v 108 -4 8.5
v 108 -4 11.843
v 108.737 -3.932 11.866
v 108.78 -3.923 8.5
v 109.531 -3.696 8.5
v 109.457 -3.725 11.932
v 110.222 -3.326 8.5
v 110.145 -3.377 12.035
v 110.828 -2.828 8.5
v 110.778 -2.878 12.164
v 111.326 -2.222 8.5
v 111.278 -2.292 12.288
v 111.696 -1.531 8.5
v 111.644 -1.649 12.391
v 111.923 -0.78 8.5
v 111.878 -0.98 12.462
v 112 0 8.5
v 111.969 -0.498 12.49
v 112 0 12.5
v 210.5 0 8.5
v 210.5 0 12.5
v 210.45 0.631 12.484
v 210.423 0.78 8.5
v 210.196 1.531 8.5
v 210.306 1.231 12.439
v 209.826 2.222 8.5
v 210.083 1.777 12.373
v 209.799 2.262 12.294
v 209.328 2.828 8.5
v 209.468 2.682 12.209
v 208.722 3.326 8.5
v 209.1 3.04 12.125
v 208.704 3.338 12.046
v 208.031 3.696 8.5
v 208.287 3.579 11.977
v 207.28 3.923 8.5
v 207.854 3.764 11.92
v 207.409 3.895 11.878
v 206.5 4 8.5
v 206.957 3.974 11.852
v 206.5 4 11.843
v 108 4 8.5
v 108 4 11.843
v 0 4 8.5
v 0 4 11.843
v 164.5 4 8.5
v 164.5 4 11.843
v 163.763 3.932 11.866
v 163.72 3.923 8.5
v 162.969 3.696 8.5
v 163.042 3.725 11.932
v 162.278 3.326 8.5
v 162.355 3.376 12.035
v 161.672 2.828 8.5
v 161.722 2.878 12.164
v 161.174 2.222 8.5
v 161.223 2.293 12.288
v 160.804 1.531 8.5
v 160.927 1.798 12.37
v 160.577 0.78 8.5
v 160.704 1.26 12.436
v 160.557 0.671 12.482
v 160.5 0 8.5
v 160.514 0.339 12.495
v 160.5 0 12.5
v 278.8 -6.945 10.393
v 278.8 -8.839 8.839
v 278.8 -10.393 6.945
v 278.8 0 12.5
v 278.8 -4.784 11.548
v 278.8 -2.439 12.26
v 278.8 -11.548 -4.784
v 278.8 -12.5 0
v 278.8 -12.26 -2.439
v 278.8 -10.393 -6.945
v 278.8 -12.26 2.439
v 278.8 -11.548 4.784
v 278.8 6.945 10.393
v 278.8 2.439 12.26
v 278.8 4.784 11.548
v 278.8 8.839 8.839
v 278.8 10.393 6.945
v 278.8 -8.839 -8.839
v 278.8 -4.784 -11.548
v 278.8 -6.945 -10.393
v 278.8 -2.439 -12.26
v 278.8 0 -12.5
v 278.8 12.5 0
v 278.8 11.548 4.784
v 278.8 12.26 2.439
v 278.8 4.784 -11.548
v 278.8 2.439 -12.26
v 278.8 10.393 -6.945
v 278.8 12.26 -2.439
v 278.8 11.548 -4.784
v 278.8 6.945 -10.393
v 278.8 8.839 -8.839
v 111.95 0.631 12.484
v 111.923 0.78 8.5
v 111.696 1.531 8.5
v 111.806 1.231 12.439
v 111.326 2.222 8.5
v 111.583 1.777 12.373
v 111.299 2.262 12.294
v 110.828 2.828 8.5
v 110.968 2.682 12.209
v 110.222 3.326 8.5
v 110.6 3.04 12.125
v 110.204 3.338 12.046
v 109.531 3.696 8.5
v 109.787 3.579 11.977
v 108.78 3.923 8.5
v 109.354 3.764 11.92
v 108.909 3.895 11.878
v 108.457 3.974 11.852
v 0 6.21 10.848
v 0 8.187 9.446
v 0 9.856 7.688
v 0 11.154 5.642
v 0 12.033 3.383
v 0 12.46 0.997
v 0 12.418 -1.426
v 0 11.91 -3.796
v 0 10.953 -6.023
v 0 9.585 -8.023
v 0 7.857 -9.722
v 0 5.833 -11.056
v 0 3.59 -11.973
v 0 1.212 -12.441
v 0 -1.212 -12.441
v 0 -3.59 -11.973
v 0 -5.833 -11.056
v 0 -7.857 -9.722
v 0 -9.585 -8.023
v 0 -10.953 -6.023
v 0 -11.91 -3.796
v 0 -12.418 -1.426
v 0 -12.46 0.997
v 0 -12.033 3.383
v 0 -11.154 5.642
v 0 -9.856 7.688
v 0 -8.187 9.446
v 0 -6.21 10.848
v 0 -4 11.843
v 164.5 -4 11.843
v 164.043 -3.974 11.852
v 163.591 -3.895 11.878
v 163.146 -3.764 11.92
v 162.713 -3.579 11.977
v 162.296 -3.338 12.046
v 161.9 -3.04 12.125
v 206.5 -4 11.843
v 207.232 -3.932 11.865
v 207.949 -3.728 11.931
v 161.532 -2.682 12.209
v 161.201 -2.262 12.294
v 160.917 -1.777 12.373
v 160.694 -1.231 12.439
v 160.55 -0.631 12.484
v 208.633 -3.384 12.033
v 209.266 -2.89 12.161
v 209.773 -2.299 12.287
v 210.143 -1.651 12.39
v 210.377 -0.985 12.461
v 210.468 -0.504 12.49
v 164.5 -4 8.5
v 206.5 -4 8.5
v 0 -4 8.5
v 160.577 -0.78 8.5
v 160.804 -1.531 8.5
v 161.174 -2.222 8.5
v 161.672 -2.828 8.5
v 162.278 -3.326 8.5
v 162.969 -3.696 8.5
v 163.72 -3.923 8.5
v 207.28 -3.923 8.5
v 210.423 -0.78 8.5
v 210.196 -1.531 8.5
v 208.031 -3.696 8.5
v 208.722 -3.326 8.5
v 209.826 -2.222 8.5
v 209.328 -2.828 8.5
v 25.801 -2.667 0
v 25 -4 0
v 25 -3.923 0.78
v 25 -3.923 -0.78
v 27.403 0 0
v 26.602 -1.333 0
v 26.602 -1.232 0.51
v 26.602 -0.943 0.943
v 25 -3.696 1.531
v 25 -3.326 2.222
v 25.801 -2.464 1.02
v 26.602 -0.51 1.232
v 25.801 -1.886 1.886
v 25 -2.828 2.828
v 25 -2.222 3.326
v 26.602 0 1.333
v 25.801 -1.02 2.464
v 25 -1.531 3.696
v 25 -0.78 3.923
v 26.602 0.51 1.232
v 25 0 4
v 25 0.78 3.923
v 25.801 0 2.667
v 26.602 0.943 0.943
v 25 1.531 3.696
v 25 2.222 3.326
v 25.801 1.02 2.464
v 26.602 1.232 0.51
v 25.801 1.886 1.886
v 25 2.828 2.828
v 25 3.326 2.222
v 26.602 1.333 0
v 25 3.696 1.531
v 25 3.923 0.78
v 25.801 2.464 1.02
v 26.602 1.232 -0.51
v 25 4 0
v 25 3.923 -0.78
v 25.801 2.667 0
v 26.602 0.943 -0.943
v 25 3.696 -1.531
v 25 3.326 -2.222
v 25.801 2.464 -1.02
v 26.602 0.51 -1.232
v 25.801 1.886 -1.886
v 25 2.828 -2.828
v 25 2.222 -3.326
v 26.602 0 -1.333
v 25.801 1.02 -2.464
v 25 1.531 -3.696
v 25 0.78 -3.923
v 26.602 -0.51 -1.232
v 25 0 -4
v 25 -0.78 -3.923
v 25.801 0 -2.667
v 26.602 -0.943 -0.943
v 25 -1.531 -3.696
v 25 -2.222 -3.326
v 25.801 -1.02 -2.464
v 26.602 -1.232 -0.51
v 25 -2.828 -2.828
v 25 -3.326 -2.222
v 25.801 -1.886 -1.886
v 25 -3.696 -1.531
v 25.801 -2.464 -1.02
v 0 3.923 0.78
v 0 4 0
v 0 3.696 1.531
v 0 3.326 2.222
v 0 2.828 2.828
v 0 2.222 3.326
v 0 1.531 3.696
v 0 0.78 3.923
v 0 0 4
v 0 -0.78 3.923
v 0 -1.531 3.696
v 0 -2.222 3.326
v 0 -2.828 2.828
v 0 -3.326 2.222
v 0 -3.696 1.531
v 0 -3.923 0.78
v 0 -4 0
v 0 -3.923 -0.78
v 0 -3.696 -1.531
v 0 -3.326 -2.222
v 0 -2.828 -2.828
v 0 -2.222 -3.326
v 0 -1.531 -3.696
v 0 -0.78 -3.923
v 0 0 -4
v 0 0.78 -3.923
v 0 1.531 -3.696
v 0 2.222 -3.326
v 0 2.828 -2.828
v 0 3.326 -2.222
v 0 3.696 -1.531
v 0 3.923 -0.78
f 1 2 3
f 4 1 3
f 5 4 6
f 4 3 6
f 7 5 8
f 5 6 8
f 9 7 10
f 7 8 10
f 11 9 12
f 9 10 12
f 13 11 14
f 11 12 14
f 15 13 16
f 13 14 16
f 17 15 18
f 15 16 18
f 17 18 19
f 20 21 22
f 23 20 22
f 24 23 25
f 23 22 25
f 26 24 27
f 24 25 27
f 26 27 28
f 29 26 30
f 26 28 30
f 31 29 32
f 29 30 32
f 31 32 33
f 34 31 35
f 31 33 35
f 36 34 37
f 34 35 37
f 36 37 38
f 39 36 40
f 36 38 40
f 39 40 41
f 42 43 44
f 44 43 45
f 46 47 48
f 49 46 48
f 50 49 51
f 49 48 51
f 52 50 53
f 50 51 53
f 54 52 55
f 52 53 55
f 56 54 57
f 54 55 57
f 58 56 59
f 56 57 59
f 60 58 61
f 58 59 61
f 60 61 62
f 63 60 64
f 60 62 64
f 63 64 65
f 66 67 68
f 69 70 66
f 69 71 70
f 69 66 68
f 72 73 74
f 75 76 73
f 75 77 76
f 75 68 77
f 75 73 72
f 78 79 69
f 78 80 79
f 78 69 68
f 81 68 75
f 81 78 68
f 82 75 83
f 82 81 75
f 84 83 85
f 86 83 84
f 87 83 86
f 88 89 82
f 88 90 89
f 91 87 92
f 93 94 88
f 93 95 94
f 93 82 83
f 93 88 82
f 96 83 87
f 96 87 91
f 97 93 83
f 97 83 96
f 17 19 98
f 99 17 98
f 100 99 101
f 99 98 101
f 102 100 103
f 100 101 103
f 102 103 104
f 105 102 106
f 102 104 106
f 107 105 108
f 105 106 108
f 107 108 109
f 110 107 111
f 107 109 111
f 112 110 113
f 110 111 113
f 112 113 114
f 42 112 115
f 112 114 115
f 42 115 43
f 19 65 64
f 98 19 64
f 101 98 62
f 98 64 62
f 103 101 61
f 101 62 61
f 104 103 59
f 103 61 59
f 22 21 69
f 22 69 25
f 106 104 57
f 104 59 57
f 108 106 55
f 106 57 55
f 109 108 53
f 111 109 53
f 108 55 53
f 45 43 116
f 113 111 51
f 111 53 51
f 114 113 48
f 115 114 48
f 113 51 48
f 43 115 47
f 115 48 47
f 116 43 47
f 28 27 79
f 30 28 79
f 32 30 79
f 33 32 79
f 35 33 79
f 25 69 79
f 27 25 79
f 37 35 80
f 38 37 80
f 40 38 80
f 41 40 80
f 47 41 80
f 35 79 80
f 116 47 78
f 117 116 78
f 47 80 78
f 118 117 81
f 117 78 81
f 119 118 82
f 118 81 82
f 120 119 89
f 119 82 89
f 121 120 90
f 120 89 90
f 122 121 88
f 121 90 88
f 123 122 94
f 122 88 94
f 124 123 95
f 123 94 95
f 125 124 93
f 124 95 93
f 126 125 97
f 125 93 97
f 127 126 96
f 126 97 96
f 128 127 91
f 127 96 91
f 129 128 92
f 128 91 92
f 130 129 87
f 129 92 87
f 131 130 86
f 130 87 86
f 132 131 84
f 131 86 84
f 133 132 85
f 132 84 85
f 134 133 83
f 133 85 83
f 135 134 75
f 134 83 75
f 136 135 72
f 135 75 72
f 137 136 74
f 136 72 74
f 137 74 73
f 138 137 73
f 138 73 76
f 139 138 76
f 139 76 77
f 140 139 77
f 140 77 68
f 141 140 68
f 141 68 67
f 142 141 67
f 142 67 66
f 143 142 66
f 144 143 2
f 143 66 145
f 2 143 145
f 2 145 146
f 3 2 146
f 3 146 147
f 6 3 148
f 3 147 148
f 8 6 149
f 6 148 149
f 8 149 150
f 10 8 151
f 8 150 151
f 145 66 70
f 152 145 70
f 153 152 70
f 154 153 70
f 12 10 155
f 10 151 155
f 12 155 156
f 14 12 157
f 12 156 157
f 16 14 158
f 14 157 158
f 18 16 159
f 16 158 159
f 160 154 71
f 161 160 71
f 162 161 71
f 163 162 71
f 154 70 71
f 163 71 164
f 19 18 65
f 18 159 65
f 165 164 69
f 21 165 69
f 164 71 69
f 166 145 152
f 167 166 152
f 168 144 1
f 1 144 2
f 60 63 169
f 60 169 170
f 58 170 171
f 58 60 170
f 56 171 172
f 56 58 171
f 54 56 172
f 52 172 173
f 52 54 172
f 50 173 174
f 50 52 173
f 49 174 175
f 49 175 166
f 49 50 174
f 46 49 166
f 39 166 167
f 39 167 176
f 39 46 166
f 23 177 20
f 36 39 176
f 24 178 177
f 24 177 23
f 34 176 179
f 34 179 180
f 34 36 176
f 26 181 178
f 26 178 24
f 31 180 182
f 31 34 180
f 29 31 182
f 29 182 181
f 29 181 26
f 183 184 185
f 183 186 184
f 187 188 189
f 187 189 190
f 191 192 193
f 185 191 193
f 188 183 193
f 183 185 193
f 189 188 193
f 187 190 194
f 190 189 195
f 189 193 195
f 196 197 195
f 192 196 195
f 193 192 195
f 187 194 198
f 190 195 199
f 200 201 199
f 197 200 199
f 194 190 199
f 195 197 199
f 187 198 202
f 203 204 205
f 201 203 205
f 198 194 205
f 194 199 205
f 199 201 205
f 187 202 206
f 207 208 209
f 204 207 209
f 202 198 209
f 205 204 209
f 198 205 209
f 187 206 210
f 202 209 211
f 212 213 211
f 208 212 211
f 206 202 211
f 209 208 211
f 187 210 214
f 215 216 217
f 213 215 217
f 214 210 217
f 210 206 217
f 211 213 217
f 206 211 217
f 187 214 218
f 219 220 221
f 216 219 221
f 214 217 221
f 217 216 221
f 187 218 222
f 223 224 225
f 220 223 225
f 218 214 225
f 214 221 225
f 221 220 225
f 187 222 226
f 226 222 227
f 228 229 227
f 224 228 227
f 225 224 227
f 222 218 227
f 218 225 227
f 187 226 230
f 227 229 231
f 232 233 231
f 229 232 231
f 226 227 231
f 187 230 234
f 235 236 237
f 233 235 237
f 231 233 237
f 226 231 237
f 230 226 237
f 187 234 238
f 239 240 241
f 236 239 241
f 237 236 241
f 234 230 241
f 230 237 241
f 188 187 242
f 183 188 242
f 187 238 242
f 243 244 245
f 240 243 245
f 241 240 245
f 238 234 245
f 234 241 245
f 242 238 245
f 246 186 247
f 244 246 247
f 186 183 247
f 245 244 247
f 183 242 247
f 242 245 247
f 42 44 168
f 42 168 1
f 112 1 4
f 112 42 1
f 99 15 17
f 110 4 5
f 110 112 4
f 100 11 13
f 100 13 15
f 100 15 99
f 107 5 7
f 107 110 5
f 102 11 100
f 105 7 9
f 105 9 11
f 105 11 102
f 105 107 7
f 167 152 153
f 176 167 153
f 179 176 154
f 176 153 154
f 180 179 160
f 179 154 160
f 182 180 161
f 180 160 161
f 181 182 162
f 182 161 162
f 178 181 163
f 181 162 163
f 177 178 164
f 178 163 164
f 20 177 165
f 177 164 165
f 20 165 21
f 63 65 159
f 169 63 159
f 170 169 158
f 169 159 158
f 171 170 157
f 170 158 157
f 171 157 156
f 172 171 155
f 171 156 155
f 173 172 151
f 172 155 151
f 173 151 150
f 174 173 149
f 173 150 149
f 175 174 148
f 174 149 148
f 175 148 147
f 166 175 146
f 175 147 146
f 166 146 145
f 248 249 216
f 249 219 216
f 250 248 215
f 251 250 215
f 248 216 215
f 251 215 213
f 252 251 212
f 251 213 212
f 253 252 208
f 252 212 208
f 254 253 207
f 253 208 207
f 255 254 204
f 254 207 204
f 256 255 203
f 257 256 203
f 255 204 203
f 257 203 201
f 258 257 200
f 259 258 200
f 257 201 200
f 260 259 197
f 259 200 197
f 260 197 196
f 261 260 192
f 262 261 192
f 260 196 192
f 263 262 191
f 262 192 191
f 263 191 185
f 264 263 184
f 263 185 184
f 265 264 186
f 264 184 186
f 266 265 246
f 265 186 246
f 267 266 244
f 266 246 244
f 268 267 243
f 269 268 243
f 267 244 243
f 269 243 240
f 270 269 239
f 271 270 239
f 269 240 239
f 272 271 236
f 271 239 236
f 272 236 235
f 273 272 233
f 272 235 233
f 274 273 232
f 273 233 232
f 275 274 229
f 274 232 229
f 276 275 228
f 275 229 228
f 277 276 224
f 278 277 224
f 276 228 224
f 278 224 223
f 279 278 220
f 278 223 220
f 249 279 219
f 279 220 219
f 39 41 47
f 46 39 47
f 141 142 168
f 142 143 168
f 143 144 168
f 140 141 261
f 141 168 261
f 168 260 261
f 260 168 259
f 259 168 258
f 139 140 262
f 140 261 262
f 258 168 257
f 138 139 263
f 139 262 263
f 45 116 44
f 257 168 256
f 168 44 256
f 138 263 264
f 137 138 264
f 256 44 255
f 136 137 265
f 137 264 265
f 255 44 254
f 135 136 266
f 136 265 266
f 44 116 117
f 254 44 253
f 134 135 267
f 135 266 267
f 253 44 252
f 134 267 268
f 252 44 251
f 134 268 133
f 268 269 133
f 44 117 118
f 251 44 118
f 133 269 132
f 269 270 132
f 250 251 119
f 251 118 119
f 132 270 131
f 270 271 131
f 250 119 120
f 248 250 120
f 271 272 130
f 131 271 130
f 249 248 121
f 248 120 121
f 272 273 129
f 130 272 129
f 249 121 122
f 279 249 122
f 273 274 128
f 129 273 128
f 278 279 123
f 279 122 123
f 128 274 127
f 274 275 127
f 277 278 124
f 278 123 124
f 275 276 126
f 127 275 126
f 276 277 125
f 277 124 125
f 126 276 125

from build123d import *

# Parameters (mm, degrees)
F0_W     = 278.8
F0_H     = 12.5
F4_DEPTH = 4
F6_D     = 8
F6_DEPTH = 25
F6_TIP   = 2.4034424761
F8_DEPTH = 4


with BuildPart() as f1:
    # F0 (on Front) → F1 (revolve)
    with BuildSketch(Plane.XZ):
        with Locations((139.4, 6.25)):
            Rectangle(F0_W, F0_H)
    revolve(axis=Axis((139.4, 0, 0), (-1, 0, 0)))

    # F3 (on offset) → F4 (cut)
    with BuildSketch(Plane.XY.offset(12.5)):
        with BuildLine():
            Line((0, 4), (0, 0))
            Line((0, 0), (0, -4))
            Line((0, -4), (108, -4))
            ThreePointArc((108, -4), (110.8284271247, -2.8284271247), (112, 0))
            ThreePointArc((112, 0), (110.8284271247, 2.8284271247), (108, 4))
            Line((108, 4), (0, 4))
        make_face()
    extrude(amount=-F4_DEPTH, mode=Mode.SUBTRACT)

    # F6
    with Locations(Plane(origin=(0, 0, 0), x_dir=(0, -1, 0), z_dir=(-1, 0, 0))):
        with Locations((0, 0)):
            Hole(F6_D / 2, depth=F6_DEPTH)
            with Locations((0, 0, -(F6_DEPTH + F6_TIP / 2))):  # 118° drill point
                Cone(0, F6_D / 2, F6_TIP, mode=Mode.SUBTRACT)

    # F7 (on offset) → F8 (cut)
    with BuildSketch(Plane.XY.offset(12.5)):
        with BuildLine():
            ThreePointArc((210.5, 0), (209.3284271247, 2.8284271247), (206.5, 4))
            Line((206.5, 4), (164.5, 4))
            ThreePointArc((164.5, 4), (161.6715728753, 2.8284271247), (160.5, 0))
            ThreePointArc((160.5, 0), (161.6715728753, -2.8284271247), (164.5, -4))
            Line((164.5, -4), (206.5, -4))
            ThreePointArc((206.5, -4), (209.3284271247, -2.8284271247), (210.5, 0))
        make_face()
    extrude(amount=-F8_DEPTH, mode=Mode.SUBTRACT)


solid = f1.part
